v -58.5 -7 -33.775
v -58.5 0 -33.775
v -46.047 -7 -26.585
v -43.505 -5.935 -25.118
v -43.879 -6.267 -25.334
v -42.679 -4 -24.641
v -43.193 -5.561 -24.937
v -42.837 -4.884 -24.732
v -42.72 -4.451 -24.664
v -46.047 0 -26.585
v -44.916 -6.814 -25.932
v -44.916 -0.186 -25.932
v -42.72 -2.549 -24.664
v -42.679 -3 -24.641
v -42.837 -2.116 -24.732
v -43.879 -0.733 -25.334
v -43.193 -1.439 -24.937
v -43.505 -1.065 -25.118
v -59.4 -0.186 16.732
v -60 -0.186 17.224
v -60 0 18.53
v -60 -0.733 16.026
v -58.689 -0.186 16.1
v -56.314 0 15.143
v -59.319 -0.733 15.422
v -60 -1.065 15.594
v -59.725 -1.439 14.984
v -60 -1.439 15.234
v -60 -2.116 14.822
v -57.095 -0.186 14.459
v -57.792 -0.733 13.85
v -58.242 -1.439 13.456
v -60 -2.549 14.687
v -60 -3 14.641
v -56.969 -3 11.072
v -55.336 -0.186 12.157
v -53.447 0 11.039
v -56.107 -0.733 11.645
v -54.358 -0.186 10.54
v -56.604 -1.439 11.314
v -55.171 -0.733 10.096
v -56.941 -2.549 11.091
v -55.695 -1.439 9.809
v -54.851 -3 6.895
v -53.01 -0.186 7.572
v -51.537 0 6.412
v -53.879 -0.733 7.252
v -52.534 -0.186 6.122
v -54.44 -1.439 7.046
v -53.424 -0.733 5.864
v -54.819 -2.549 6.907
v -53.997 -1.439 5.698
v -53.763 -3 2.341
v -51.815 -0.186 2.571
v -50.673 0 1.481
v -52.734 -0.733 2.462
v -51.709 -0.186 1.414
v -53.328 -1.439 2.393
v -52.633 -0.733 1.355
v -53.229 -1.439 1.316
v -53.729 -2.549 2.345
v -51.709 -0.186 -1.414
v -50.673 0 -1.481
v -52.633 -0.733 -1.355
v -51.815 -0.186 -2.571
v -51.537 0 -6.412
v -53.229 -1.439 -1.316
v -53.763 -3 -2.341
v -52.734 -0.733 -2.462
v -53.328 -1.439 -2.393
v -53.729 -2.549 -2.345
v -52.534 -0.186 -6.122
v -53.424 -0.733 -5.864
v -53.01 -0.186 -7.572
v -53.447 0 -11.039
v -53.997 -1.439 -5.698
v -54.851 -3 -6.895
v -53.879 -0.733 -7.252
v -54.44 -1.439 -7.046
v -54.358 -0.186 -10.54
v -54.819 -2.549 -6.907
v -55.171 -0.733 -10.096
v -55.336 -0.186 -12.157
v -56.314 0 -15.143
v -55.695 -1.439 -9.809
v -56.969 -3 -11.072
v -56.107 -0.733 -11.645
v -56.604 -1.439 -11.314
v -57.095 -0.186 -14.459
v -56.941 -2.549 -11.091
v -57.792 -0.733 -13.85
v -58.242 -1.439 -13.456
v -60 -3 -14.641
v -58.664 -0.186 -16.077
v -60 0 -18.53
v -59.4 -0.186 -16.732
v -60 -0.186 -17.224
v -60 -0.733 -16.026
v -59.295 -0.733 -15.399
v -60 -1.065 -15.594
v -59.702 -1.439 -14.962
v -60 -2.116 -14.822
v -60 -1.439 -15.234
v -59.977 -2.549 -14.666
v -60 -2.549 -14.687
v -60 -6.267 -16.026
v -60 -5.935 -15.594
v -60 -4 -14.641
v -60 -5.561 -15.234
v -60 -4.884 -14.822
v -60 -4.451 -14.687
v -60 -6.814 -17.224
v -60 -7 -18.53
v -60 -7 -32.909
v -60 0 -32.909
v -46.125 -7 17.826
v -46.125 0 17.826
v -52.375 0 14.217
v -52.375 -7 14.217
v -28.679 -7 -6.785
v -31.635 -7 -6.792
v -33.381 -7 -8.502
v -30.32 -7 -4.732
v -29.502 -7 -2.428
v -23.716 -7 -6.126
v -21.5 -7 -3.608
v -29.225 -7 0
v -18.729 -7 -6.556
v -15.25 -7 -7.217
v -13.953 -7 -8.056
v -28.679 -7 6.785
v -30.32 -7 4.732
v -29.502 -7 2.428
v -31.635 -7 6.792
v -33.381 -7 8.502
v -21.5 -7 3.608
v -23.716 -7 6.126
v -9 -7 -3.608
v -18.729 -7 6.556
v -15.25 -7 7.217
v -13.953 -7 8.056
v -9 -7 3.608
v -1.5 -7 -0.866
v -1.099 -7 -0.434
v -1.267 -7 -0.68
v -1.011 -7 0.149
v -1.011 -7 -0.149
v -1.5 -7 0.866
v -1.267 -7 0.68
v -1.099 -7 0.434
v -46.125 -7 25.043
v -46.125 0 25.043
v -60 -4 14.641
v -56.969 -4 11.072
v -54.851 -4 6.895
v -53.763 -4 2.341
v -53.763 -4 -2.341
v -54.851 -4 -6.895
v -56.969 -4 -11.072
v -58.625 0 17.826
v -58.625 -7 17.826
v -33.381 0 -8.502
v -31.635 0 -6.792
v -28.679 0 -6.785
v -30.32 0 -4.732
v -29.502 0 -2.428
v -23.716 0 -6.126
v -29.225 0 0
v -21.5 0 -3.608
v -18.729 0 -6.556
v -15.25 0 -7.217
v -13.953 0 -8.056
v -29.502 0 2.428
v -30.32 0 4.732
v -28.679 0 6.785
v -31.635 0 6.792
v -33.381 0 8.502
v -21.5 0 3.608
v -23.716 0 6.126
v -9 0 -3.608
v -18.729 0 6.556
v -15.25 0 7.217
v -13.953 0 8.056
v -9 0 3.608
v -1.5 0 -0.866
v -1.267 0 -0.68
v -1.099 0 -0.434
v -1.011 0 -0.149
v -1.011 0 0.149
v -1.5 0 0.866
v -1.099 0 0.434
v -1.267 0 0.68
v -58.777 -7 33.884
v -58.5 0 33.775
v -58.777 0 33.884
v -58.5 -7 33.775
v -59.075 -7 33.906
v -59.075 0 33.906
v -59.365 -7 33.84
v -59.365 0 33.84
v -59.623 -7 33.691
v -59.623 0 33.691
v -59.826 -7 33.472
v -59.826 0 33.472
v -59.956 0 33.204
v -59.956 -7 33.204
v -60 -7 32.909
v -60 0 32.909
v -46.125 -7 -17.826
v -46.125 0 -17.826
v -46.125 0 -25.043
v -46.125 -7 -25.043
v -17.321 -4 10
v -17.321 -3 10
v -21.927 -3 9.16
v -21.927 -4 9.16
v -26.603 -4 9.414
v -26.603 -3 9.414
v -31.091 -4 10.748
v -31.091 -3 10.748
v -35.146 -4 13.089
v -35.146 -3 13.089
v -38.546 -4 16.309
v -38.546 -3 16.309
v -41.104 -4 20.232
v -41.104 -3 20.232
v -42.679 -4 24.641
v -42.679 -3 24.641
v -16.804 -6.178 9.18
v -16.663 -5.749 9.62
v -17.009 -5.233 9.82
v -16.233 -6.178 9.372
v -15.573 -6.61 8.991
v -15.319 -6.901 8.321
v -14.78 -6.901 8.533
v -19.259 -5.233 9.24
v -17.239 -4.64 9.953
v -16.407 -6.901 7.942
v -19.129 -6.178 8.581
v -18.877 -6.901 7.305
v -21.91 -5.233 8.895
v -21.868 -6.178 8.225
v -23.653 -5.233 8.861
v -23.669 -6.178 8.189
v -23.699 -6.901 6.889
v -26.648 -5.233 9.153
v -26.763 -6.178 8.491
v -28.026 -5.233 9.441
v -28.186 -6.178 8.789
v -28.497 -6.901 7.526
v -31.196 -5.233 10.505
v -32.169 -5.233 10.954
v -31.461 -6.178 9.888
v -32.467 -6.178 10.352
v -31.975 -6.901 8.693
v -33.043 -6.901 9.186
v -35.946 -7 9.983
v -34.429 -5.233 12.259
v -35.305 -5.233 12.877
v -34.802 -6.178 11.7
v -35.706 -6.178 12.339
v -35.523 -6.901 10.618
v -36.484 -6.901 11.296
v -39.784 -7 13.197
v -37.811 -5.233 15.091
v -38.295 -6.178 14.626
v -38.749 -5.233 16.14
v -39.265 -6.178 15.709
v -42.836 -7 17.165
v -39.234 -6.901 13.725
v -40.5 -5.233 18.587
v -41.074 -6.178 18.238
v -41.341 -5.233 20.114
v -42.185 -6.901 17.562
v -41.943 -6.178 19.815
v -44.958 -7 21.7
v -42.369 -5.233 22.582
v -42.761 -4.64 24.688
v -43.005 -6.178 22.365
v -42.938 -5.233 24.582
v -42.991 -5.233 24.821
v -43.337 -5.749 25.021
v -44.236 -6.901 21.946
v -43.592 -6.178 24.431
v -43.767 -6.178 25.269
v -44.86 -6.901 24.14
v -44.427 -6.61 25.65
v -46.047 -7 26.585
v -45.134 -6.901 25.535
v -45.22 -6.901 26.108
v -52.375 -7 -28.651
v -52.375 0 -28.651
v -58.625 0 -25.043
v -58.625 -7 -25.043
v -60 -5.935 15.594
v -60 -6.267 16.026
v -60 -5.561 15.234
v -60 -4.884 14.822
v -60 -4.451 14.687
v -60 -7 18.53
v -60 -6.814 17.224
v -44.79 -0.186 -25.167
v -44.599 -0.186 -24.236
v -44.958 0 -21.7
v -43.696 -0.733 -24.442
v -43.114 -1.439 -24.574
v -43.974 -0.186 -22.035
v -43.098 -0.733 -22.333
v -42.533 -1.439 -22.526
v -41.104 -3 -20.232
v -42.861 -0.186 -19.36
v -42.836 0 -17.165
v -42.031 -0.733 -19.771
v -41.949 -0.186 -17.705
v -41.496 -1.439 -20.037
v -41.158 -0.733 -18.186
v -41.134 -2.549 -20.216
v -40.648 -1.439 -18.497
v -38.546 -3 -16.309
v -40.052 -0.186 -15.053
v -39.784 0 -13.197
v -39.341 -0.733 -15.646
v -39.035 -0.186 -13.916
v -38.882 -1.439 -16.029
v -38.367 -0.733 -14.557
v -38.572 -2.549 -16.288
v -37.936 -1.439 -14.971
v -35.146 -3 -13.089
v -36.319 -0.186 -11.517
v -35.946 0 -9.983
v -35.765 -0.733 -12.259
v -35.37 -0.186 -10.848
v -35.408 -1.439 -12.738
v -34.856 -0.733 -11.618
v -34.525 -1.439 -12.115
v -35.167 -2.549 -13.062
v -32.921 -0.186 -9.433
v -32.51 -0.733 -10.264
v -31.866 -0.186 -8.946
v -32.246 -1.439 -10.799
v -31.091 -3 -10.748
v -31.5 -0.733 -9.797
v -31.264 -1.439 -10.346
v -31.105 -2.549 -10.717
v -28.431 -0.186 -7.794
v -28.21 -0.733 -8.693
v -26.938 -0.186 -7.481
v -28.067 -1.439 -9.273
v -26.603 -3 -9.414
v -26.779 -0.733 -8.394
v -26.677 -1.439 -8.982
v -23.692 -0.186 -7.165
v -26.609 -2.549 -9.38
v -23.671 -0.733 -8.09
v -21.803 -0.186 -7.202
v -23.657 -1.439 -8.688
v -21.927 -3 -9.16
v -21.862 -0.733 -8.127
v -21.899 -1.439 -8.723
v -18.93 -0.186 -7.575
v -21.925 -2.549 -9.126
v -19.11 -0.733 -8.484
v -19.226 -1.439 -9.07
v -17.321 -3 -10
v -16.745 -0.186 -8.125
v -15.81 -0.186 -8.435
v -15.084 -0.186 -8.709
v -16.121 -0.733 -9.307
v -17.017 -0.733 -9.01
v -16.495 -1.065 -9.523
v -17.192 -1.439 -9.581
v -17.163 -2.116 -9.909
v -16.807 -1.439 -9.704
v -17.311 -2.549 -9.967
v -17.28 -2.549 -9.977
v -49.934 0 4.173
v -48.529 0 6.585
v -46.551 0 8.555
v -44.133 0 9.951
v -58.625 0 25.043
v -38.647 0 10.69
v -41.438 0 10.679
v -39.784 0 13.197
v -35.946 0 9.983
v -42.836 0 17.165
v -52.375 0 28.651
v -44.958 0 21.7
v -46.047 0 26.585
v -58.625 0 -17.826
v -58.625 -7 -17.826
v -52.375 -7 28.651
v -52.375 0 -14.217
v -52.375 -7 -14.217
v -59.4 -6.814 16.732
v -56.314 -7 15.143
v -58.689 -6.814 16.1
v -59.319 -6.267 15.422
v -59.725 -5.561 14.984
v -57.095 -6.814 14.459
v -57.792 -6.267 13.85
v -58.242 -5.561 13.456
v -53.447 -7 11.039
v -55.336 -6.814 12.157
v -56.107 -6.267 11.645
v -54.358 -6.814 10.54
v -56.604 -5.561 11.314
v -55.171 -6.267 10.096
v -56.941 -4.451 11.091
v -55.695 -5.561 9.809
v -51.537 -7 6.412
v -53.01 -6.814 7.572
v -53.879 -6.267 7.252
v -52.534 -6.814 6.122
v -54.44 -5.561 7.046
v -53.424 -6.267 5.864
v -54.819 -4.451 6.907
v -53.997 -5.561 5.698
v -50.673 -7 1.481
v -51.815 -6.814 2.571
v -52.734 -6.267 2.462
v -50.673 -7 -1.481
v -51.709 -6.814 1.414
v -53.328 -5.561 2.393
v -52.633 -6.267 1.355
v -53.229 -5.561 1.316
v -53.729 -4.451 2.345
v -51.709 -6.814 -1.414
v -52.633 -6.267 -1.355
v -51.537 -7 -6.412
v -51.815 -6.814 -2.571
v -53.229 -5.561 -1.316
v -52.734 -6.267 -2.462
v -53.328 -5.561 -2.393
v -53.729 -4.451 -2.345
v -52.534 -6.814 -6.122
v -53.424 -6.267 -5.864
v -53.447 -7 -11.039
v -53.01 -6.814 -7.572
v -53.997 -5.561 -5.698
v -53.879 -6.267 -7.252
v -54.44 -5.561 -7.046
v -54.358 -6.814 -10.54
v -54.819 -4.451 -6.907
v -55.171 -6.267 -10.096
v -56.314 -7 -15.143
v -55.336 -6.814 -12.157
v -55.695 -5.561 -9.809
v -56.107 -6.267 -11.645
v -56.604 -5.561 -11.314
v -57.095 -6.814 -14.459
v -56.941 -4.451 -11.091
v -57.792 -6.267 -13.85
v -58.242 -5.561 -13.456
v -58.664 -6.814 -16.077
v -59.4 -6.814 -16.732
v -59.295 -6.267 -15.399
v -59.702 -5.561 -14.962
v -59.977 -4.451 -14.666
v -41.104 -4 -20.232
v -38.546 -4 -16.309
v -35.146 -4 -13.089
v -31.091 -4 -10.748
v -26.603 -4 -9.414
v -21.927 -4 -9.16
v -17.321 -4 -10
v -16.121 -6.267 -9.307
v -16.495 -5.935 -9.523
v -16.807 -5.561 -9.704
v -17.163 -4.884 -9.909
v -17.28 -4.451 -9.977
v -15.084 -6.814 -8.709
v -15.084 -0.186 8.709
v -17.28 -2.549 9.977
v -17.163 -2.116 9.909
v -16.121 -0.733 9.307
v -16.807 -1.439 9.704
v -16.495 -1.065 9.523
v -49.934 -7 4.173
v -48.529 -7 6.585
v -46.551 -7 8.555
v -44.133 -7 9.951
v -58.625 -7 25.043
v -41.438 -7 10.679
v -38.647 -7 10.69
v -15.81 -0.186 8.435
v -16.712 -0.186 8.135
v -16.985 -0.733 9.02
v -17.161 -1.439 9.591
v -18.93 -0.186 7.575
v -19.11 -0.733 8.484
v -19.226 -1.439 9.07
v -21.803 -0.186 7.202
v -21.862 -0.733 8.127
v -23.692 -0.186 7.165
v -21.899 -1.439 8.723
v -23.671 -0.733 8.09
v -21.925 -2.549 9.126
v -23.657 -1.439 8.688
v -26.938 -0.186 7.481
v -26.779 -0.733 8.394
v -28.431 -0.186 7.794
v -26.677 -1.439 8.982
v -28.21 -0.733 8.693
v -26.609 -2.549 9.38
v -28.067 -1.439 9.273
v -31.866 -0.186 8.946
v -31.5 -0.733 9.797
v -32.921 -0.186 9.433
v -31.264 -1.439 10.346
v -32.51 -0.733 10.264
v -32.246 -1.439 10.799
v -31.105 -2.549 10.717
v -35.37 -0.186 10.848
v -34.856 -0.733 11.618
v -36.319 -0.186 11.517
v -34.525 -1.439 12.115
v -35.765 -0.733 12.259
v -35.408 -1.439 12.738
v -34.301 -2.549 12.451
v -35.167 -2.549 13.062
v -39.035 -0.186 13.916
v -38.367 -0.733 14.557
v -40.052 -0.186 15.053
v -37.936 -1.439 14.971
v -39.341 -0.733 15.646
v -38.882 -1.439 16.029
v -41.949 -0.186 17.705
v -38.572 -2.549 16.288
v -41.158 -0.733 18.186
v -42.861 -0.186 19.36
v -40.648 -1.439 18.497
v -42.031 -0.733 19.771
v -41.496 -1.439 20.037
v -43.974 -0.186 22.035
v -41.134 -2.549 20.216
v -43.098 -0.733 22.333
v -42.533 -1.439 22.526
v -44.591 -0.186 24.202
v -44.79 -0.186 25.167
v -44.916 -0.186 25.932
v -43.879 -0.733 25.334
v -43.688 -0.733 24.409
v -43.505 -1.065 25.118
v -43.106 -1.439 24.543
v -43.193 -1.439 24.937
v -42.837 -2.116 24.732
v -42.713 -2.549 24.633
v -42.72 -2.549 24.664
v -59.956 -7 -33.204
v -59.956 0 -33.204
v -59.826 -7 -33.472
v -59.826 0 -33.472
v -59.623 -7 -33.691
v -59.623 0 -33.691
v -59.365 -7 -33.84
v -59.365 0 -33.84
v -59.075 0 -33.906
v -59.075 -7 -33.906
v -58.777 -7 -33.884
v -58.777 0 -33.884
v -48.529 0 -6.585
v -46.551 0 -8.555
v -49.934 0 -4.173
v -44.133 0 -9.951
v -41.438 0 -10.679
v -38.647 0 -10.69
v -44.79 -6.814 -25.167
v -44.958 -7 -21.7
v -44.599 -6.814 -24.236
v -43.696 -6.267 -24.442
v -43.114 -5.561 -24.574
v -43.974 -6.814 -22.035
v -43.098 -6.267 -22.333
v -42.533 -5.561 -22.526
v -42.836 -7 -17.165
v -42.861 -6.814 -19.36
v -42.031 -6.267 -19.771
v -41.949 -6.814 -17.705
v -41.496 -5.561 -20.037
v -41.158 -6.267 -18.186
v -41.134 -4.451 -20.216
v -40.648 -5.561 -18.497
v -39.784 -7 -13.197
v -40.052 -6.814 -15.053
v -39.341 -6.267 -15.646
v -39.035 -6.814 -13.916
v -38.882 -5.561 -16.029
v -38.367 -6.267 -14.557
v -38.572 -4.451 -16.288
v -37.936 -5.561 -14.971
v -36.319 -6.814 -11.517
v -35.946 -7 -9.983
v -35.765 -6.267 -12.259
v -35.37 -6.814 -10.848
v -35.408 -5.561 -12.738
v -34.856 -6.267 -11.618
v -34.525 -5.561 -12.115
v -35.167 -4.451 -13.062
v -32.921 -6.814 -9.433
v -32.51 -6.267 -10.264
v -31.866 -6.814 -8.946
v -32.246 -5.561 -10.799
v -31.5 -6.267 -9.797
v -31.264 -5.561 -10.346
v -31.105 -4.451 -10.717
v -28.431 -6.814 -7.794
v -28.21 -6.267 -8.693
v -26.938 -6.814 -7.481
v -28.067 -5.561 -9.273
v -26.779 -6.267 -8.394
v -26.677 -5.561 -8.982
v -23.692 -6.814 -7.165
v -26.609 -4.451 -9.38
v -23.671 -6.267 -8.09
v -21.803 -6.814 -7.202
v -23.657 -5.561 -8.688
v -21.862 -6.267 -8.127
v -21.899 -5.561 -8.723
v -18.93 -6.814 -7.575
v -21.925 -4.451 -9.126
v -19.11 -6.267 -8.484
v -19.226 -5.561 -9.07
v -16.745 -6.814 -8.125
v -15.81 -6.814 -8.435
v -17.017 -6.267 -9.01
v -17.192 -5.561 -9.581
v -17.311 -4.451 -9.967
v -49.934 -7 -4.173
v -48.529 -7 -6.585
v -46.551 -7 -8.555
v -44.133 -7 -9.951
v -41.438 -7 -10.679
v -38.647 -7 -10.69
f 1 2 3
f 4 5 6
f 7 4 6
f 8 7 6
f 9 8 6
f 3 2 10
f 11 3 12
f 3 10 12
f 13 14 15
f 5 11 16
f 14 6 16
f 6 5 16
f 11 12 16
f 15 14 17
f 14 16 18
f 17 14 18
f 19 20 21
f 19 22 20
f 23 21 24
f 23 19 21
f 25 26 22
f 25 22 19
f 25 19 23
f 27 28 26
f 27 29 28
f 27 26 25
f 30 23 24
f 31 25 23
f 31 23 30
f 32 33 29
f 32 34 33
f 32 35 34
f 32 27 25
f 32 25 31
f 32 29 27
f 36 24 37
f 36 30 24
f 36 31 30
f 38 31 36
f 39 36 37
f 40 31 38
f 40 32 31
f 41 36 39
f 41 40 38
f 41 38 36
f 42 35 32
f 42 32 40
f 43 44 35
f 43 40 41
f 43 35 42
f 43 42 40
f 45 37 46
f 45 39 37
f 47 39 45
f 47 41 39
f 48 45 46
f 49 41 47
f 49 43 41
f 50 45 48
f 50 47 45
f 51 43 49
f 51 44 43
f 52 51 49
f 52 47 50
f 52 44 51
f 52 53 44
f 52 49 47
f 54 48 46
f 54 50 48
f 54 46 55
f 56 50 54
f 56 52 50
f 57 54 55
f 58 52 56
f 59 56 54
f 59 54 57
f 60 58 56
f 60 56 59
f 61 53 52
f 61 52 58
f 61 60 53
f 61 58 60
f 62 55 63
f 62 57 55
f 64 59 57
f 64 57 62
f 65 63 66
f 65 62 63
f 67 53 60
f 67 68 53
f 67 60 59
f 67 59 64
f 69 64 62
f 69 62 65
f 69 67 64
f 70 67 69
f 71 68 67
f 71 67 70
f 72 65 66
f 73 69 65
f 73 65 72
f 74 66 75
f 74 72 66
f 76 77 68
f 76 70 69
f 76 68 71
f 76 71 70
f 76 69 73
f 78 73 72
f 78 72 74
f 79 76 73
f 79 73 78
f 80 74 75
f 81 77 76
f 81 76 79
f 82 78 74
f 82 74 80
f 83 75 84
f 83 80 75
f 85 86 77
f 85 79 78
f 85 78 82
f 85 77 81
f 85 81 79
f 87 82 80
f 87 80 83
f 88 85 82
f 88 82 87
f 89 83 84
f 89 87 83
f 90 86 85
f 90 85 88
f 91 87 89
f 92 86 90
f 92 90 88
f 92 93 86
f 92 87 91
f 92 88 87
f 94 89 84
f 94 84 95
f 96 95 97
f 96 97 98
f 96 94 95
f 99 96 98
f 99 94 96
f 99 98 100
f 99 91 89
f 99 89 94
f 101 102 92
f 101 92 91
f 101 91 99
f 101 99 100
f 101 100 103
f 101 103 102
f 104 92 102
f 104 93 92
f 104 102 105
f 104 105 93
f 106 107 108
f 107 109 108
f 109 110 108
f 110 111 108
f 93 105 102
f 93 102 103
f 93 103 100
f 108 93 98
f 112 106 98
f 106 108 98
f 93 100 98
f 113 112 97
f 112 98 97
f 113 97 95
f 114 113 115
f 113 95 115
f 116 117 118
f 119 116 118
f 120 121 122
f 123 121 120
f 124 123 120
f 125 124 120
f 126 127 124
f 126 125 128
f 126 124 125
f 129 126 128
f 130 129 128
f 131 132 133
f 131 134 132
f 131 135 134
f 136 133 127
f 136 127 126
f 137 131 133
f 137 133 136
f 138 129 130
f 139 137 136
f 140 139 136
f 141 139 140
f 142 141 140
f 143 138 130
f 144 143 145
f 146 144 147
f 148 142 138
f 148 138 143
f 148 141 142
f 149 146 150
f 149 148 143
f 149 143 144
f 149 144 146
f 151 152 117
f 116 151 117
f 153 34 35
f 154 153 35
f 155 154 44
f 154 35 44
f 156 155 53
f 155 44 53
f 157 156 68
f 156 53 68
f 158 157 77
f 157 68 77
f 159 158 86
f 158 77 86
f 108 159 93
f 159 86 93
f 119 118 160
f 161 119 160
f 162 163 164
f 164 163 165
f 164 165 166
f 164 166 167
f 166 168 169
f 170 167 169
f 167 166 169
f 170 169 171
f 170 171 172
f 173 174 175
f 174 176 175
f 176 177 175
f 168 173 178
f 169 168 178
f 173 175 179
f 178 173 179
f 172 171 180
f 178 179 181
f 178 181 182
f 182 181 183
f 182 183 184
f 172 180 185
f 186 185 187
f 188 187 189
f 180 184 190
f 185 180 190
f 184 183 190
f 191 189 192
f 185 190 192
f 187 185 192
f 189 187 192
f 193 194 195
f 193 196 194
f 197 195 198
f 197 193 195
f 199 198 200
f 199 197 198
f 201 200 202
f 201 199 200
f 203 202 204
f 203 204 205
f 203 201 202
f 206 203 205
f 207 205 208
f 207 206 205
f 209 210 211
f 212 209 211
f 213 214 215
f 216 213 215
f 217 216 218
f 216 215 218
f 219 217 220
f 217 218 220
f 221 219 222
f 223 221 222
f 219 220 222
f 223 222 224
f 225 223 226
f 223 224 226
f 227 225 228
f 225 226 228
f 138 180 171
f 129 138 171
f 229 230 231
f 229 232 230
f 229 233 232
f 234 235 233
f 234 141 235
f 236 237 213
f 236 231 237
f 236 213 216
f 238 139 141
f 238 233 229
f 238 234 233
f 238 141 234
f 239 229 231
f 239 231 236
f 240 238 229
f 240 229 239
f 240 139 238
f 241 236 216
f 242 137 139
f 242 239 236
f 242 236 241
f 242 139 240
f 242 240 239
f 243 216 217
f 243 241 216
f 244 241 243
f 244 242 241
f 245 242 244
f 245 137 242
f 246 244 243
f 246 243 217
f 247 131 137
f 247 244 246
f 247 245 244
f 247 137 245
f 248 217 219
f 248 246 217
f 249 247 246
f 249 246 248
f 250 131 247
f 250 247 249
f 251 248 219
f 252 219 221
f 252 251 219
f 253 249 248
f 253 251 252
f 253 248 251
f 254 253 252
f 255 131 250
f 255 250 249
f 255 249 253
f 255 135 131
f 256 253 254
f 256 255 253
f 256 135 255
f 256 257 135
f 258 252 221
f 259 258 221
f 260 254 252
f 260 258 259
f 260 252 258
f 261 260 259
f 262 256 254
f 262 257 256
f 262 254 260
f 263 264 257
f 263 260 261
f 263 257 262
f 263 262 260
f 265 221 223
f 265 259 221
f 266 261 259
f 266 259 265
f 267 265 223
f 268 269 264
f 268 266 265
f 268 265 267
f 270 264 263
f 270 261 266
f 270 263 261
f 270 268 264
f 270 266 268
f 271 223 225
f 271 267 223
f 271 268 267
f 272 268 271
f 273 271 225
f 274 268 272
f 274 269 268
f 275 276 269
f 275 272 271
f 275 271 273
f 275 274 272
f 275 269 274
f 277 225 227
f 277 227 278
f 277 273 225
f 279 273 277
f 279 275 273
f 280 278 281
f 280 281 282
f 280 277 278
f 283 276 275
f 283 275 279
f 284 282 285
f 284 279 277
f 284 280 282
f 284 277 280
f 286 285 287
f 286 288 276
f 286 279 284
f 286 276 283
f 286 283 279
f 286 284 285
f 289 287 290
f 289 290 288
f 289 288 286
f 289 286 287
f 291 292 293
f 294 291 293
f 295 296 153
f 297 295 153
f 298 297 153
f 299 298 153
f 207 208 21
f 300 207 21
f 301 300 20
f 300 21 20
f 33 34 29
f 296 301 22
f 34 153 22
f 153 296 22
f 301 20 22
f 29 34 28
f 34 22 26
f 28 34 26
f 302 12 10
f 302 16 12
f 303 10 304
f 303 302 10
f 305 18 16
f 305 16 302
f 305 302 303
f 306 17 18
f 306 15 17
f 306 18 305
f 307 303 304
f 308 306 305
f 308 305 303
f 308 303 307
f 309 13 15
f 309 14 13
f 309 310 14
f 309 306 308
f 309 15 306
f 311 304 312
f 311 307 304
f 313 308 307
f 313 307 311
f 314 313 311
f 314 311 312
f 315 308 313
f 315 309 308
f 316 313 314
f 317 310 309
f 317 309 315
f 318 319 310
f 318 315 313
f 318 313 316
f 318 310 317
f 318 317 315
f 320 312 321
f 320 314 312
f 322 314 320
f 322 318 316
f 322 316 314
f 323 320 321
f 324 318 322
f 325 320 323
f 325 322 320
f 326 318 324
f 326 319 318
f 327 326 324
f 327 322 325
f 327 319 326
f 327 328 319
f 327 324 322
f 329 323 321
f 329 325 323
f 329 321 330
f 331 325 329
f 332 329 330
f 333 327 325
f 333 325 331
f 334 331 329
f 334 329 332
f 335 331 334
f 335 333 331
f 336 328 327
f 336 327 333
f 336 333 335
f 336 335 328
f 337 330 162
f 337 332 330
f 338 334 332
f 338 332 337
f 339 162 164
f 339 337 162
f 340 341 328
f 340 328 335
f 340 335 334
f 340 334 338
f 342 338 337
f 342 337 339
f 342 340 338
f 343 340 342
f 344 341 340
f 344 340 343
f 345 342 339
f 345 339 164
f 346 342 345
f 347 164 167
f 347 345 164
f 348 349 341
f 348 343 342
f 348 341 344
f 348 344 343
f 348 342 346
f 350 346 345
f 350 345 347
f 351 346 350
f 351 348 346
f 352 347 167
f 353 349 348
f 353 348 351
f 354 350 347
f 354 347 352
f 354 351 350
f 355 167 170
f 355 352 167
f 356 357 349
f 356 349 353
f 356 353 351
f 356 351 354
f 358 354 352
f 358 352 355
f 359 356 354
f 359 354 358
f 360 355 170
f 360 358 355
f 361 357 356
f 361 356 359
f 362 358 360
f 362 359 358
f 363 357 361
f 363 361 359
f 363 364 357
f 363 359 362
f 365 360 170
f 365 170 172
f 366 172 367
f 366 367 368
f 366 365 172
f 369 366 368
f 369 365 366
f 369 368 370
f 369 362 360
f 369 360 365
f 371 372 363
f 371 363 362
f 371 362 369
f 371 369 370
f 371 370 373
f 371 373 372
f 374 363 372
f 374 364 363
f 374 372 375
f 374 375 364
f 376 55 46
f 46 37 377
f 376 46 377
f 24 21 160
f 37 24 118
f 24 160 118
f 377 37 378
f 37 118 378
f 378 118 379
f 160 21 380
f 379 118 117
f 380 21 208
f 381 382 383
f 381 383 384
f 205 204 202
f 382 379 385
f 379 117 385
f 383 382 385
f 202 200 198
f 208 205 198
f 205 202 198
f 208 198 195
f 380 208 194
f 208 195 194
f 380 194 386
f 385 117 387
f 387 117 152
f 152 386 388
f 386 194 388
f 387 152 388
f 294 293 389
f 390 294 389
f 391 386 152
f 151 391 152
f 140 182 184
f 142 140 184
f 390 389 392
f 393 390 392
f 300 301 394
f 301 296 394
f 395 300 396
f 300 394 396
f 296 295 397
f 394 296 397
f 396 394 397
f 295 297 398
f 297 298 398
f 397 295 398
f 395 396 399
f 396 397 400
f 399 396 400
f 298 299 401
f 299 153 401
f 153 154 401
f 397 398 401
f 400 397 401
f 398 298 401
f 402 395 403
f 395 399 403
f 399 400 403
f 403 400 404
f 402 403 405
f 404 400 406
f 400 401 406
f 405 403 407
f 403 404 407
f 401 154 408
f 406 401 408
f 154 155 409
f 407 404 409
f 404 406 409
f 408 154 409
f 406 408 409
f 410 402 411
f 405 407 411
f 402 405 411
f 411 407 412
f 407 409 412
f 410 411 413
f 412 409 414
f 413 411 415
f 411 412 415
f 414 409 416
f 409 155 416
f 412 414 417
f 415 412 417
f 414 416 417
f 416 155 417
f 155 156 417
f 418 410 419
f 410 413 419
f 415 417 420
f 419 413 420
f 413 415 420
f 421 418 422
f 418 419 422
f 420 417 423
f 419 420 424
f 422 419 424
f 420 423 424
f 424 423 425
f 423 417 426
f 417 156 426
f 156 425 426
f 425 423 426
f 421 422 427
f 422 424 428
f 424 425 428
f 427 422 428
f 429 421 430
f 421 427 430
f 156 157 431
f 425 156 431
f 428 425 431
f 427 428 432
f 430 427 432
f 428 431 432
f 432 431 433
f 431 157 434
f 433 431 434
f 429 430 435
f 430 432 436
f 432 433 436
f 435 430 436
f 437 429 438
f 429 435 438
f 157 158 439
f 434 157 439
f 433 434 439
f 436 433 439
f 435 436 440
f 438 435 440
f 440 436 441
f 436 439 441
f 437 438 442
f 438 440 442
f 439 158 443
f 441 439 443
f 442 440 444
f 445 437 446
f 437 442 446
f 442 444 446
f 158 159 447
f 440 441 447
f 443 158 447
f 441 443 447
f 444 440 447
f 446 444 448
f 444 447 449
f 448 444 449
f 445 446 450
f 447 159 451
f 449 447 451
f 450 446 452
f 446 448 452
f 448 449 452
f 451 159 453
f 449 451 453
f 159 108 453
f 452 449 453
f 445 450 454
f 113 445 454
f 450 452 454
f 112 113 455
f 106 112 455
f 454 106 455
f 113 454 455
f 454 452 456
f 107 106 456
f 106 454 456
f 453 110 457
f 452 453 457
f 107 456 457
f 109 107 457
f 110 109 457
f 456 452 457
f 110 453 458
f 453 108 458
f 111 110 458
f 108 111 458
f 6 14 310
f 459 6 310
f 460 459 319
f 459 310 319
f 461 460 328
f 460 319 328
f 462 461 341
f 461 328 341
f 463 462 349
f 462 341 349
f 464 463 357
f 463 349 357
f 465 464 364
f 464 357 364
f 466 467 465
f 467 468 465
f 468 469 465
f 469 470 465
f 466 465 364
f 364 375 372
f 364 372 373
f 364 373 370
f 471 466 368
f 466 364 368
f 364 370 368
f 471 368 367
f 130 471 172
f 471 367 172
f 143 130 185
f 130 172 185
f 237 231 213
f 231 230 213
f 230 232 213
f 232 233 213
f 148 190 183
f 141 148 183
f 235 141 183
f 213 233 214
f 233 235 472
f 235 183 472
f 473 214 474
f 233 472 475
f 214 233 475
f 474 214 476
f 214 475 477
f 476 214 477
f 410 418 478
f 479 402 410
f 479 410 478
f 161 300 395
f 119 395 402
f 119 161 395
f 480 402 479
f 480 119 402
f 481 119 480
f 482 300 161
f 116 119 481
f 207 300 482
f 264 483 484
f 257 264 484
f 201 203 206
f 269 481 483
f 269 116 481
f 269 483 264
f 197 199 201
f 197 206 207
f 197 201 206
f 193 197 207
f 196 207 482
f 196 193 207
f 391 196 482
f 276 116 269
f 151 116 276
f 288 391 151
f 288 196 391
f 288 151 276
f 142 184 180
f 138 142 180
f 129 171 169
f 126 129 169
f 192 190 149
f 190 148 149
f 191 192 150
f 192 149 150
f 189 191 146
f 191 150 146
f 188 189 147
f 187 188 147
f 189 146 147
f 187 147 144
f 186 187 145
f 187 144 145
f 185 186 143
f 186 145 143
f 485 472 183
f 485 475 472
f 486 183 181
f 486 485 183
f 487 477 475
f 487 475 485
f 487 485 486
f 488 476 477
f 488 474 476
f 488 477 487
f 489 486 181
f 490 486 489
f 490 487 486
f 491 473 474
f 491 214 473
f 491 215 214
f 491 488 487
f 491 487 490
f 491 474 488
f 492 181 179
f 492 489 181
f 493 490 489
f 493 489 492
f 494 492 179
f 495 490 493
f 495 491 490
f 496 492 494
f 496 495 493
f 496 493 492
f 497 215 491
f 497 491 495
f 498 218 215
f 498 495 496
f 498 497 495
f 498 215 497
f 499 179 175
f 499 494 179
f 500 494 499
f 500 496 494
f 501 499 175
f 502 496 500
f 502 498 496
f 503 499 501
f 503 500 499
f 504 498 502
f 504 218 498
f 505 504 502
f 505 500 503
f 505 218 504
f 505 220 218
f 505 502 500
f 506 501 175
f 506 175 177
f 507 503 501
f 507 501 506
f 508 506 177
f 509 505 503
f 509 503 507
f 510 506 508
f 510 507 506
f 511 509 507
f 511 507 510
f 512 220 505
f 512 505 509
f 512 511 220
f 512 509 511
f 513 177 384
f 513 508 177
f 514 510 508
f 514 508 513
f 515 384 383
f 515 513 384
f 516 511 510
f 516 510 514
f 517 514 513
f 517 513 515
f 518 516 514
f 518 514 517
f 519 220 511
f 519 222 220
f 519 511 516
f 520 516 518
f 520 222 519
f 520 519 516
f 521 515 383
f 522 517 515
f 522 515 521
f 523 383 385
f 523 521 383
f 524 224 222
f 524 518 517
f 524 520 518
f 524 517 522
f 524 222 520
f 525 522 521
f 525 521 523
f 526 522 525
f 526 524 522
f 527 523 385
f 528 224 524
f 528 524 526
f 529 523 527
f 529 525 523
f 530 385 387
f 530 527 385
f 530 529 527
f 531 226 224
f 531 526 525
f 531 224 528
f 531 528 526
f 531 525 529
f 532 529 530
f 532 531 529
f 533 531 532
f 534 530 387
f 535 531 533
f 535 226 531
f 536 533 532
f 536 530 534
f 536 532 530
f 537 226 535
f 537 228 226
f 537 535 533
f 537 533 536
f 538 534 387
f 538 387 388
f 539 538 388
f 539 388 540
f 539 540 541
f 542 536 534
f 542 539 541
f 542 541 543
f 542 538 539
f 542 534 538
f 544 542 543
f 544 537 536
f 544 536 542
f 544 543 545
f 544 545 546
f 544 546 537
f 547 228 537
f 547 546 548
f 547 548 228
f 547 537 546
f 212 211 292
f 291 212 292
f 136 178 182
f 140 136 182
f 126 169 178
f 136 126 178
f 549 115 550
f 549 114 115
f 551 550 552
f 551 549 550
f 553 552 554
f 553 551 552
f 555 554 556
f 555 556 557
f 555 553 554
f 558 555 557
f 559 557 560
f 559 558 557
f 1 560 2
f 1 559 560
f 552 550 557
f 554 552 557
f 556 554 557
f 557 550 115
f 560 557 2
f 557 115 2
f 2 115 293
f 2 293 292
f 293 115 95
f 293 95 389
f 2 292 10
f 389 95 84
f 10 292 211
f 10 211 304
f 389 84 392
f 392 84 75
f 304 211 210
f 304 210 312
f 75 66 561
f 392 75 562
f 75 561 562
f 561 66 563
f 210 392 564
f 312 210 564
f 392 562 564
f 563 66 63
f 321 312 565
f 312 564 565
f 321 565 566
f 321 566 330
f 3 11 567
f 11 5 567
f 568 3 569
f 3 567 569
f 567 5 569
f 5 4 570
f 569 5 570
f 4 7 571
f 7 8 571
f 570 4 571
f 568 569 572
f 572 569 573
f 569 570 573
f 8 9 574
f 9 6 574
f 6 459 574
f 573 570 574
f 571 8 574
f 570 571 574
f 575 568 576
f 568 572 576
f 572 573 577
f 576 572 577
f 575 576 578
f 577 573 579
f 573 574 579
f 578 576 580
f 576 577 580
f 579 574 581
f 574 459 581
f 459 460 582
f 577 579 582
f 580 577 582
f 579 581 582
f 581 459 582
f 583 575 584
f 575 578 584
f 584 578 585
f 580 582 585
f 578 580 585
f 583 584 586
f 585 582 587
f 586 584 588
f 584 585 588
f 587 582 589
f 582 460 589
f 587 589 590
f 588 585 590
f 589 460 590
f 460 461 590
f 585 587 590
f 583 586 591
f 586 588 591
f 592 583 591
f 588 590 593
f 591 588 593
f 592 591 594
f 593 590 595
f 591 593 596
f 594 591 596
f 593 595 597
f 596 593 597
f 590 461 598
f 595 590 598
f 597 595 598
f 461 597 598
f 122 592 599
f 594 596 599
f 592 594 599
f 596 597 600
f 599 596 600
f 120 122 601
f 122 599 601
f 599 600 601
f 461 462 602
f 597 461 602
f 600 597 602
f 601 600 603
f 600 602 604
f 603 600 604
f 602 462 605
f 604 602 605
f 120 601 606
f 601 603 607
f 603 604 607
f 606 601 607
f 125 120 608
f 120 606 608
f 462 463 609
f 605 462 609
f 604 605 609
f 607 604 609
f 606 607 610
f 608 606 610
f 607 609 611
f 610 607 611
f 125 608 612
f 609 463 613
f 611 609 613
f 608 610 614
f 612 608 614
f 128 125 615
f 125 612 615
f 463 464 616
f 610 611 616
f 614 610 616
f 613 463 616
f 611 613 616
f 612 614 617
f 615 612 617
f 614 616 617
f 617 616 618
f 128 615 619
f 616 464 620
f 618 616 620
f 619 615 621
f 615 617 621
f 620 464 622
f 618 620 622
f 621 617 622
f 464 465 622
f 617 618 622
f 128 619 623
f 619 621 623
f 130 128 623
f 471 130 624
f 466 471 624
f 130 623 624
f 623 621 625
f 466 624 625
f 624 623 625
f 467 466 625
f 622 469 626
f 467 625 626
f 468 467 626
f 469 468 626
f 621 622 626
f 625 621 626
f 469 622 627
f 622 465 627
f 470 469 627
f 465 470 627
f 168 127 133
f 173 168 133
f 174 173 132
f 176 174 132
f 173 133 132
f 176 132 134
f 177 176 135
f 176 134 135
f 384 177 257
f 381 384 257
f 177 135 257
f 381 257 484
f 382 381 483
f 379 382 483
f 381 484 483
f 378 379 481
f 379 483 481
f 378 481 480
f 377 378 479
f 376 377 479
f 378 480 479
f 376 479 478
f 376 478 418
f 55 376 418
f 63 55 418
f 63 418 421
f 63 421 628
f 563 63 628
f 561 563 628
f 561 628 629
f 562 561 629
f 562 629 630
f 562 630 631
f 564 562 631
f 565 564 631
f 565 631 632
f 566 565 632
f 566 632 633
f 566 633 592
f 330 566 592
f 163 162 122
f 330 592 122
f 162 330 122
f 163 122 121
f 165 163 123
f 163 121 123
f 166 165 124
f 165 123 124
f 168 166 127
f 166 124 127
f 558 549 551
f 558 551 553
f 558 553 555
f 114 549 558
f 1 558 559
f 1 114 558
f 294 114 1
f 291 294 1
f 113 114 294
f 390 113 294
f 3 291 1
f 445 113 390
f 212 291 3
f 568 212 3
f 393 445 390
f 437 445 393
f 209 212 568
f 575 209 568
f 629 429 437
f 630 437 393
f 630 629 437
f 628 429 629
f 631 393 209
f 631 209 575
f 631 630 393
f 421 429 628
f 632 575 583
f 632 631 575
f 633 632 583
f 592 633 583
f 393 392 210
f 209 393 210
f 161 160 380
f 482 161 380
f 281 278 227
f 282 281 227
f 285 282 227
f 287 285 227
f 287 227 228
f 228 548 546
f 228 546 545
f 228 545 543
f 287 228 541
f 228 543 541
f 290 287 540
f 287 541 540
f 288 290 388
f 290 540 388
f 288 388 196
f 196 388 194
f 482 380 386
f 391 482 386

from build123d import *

# Parameters (mm, degrees)
F1_DEPTH = 7
F2_R     = 1
F3_R     = 3
F4_R     = 10.775
F5_DEPTH = 12.5


with BuildPart() as f1:
    # F0 (on Front) → F1 (new body)
    with BuildSketch(Plane.XZ):
        with BuildLine():
            Line((-42.679492, 24.641016), (-60, 34.641016))
            Line((-60, 34.641016), (-60, 14.641016))
            ThreePointArc((-60, 14.641016), (-53.625001, 0), (-60, -14.641016))
            Line((-60, -14.641016), (-60, -34.641016))
            Line((-60, -34.641016), (-42.679492, -24.641016))
            ThreePointArc((-42.679492, -24.641016), (-33.1875, -11.799597), (-17.320508, -10))
            Line((-17.320508, -10), (0, 0))
            Line((0, 0), (-17.320508, 10))
            ThreePointArc((-17.320508, 10), (-33.1875, 11.799597), (-42.679492, 24.641016))
        make_face()
        Polygon((-46.125, -25.042568), (-52.375, -28.651007), (-58.625, -25.042568), (-58.625, -17.82569), (-52.375, -14.21725), (-46.125, -17.82569), align=None, mode=Mode.SUBTRACT)
        Polygon((-46.125, 17.82569), (-52.375, 14.21725), (-58.625, 17.82569), (-58.625, 25.042568), (-52.375, 28.651007), (-46.125, 25.042568), align=None, mode=Mode.SUBTRACT)
        Polygon((-15.25, -7.216878), (-21.5, -3.608439), (-21.5, 3.608439), (-15.25, 7.216878), (-9, 3.608439), (-9, -3.608439), align=None, mode=Mode.SUBTRACT)
    extrude(amount=F1_DEPTH)

    # F2
    f2_edges = [f1.edges().sort_by_distance(p)[0] for p in [
        (-60, -3.5, 34.641016),
        (-60, -3.5, -34.641016),
        (0, -3.5, 0),
    ]]
    fillet(f2_edges, radius=F2_R)

    # F3
    f3_edges = [f1.edges().sort_by_distance(p)[0] for p in [
        (-53.625001, 0, 0),
        (-53.625001, -7, 0),
        (-33.1875, -7, 11.799597),
        (-33.1875, -7, -11.799597),
        (-33.1875, 0, -11.799597),
        (-33.1875, 0, 11.799597),
    ]]
    fillet(f3_edges, radius=F3_R)

    # F4 (on Front) → F5 (cut, symmetric)
    with BuildSketch(Plane.XZ):
        with Locations((-40, 0)):
            Circle(F4_R)
    extrude(amount=F5_DEPTH, both=True, mode=Mode.SUBTRACT)


solid = f1.part
